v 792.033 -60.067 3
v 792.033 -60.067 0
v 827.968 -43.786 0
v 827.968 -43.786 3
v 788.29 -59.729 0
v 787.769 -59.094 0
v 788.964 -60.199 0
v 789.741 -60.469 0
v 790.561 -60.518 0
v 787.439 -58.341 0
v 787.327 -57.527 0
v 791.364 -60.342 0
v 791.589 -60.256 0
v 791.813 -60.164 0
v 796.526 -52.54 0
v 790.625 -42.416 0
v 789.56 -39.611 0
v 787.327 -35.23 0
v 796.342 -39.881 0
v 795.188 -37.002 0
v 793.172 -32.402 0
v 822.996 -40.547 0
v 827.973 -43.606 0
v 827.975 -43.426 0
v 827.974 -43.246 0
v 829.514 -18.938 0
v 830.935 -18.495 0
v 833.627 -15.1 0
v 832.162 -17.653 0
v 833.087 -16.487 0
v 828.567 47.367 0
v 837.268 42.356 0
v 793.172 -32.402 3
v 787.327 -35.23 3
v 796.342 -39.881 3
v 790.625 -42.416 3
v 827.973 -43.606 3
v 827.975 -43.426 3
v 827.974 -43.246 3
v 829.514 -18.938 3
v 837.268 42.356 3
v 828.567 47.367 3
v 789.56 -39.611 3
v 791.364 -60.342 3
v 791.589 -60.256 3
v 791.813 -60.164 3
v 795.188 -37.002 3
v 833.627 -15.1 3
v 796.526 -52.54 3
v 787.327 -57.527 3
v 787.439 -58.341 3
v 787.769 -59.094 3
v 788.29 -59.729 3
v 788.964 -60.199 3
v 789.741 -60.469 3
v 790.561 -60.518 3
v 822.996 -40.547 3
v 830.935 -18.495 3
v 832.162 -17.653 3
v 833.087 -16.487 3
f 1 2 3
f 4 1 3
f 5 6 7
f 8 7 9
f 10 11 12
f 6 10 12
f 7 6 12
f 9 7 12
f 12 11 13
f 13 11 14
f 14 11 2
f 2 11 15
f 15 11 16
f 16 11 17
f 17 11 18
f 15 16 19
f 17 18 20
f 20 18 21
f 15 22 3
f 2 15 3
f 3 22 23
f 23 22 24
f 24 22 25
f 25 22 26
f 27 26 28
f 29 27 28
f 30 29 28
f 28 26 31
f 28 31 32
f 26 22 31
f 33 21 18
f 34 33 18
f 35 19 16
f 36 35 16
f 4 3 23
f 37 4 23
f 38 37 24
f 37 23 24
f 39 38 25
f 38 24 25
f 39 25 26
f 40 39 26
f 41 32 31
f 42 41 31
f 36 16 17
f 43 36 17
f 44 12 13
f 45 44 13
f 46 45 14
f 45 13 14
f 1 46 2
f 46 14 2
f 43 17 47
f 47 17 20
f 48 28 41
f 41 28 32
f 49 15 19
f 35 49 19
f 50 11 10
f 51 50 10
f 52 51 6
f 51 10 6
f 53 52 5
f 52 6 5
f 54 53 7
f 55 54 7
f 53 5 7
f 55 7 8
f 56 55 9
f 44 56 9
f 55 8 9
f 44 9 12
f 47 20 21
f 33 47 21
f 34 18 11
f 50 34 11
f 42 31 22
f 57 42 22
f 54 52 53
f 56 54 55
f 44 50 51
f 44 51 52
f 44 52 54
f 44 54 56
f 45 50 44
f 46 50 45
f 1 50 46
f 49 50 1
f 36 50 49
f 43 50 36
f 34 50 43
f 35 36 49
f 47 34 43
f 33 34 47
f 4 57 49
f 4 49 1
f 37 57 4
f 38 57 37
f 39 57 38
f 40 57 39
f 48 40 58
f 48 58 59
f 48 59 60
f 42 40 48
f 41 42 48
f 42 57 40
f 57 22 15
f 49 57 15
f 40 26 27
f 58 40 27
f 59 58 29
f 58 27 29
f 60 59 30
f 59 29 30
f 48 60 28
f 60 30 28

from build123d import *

# Parameters (mm, degrees)
BASE_EXTRUDE_DEPTH = 3


with BuildPart() as part:
    # Sketch1 → Base-Extrude (new body)
    with BuildSketch(Plane.XY):
        with BuildLine():
            Line((827.973978263, -43.245786047), (829.514372586, -18.937919224))
            ThreePointArc((829.514372586, -18.937919224), (832.162066859, -17.653066314), (833.626640717, -15.100390193))
            Line((833.626640717, -15.100390193), (837.267672807, 42.356146641))
            Line((837.267672807, 42.356146641), (828.567150472, 47.366870762))
            Line((828.567150472, 47.366870762), (822.996025927, -40.547081848))
            Line((822.996025927, -40.547081848), (796.525541864, -52.540147354))
            Line((796.525541864, -52.540147354), (796.34247294, -39.8809937))
            Line((796.34247294, -39.8809937), (790.624612073, -42.415731004))
            Line((790.624612073, -42.415731004), (789.560278608, -39.610879088))
            Line((789.560278608, -39.610879088), (795.188053447, -37.002397586))
            Line((795.188053447, -37.002397586), (793.171716746, -32.401991353))
            Line((793.171716746, -32.401991353), (787.326904418, -35.230416068))
            Line((787.326904418, -35.230416068), (787.326904418, -57.526741279))
            ThreePointArc((787.326904418, -57.526741279), (788.61109588, -59.98763564), (791.364238458, -60.341690318))
            ThreePointArc((791.364238458, -60.341690318), (791.701286321, -60.210514776), (792.033370234, -60.067236869))
            Line((792.033370234, -60.067236869), (827.968278958, -43.7860947))
            ThreePointArc((827.968278958, -43.7860947), (827.974778648, -43.515978875), (827.973978263, -43.245786047))
        make_face()
    extrude(amount=BASE_EXTRUDE_DEPTH)


solid = part.part
